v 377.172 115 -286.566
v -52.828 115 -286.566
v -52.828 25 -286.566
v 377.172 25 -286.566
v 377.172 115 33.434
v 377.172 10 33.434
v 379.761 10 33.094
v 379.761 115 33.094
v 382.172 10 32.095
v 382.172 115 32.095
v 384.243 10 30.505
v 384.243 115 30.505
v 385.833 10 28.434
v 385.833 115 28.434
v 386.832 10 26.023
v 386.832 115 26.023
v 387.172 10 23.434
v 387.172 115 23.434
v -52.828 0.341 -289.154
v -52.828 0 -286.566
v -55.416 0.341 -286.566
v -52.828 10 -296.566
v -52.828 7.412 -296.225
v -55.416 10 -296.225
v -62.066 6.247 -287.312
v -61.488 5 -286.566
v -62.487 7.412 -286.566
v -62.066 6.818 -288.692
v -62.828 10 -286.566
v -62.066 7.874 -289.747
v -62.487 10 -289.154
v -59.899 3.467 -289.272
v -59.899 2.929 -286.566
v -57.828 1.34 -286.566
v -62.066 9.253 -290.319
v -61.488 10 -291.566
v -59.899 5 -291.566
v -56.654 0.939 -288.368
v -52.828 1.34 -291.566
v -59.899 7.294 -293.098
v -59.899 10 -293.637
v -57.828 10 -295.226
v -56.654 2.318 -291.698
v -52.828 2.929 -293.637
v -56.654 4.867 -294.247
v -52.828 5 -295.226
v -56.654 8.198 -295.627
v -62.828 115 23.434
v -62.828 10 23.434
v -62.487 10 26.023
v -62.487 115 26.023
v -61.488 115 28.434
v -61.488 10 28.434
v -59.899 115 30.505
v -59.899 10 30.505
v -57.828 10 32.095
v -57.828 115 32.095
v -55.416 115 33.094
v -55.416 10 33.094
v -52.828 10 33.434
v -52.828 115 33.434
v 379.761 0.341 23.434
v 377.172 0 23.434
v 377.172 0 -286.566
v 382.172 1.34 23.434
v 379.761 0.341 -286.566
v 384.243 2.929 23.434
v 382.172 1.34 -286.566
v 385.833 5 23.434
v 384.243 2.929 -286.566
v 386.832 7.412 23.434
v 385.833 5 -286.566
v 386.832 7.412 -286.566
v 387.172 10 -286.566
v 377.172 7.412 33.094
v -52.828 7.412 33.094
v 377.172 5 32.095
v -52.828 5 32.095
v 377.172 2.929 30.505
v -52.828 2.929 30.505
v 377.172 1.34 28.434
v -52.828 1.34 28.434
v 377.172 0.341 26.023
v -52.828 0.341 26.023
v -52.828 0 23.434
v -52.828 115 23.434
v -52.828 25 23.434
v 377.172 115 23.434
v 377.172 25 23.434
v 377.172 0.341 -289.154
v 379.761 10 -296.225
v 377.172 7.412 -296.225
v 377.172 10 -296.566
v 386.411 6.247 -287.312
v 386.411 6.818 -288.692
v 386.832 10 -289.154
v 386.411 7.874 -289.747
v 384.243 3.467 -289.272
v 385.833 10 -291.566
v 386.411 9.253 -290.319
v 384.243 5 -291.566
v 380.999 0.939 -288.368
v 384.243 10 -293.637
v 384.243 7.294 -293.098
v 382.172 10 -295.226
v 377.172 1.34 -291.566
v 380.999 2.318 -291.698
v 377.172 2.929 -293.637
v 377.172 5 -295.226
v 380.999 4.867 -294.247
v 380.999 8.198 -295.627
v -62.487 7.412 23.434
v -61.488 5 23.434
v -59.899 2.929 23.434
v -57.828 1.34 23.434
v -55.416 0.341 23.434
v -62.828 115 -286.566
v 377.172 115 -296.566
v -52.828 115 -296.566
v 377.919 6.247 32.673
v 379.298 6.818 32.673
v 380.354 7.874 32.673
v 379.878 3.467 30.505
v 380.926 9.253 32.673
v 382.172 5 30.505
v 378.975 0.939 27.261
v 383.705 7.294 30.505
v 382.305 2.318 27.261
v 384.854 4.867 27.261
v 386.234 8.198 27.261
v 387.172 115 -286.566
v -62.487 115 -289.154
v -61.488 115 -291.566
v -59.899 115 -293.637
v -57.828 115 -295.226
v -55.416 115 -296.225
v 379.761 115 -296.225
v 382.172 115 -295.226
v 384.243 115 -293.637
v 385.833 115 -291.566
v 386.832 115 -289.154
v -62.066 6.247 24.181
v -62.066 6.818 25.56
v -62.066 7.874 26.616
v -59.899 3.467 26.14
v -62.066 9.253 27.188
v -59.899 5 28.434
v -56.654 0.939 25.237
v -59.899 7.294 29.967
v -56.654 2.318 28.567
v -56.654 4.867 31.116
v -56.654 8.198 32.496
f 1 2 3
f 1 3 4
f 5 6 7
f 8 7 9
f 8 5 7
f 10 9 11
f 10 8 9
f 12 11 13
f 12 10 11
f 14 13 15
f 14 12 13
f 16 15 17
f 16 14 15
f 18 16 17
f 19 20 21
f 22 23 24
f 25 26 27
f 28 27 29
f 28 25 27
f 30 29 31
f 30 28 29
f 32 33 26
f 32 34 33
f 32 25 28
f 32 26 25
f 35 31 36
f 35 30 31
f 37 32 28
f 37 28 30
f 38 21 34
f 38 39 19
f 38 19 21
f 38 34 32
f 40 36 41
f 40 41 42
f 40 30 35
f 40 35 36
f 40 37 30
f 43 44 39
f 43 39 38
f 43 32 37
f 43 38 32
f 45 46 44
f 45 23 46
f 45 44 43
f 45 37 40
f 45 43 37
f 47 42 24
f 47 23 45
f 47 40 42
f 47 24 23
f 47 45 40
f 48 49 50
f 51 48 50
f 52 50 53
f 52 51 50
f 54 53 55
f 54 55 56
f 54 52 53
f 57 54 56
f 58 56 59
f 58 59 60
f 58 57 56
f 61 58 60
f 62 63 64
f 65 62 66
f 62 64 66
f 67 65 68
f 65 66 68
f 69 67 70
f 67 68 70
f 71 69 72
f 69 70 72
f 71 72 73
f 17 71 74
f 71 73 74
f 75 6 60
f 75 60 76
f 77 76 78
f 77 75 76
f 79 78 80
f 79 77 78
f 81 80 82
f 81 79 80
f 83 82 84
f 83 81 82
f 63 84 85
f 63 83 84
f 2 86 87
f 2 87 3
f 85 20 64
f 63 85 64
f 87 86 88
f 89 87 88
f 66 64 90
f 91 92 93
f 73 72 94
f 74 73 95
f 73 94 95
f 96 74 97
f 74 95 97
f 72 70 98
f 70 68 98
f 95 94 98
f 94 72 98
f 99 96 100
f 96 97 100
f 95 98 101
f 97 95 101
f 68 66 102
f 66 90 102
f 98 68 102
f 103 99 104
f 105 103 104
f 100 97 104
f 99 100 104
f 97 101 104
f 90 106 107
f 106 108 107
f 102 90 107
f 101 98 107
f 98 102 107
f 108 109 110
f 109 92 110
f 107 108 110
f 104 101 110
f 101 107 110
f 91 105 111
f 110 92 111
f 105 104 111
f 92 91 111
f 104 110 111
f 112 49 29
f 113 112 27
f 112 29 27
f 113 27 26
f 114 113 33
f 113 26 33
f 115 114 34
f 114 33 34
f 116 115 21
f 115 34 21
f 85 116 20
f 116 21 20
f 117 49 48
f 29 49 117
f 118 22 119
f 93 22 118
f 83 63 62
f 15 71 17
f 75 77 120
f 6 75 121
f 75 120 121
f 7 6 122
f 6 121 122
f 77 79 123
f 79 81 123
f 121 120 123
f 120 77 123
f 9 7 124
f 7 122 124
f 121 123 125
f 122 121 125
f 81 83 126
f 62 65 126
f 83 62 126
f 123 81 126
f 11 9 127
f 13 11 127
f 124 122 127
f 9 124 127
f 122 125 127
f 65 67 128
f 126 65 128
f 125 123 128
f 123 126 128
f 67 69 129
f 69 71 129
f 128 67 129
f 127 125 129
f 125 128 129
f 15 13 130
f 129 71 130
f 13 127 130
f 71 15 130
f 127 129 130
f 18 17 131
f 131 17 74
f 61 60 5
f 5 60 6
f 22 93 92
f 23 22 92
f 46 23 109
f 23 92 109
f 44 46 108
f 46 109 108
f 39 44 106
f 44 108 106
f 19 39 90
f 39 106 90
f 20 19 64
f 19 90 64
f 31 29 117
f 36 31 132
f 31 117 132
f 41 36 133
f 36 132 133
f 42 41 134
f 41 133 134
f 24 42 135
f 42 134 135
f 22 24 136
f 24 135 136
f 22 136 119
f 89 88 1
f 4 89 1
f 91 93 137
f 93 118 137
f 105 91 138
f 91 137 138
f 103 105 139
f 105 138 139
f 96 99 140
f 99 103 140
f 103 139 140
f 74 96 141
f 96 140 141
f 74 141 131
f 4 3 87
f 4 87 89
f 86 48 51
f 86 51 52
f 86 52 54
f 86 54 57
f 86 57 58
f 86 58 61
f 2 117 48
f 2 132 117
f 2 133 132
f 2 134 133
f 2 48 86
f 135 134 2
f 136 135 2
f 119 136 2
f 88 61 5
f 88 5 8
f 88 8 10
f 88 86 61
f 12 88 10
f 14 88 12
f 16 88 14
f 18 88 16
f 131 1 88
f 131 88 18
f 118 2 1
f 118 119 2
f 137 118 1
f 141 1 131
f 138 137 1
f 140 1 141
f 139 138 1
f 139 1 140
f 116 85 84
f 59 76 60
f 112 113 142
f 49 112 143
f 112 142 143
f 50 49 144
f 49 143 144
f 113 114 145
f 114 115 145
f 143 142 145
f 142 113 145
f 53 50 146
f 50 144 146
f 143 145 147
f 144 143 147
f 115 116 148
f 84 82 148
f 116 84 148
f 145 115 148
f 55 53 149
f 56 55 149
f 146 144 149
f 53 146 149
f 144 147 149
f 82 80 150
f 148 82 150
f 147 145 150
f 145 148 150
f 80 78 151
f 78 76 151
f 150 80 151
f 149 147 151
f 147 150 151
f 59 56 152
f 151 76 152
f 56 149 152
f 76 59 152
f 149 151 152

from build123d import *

# Parameters (mm, degrees)
SKETCH1_W           = 450
SKETCH1_H           = 330
BOSS_EXTRUDE1_DEPTH = 115
SKETCH2_W           = 430
SKETCH2_H           = 310
CUT_EXTRUDE1_DEPTH  = 90
FILLET1_R           = 10


with BuildPart() as part:
    # Sketch1 → Boss-Extrude1 (new body)
    with BuildSketch(Plane(origin=(0, 0, 0), x_dir=(1, 0, 0), z_dir=(0, 1, 0))):
        with Locations((162.172357903, 131.565585437)):
            Rectangle(SKETCH1_W, SKETCH1_H)
    extrude(amount=BOSS_EXTRUDE1_DEPTH)

    # Sketch2 → Cut-Extrude1 (cut)
    with BuildSketch(Plane(origin=(0, 115, 0), x_dir=(1, 0, 0), z_dir=(0, 1, 0))):
        with Locations((162.172357903, 131.565585437)):
            Rectangle(SKETCH2_W, SKETCH2_H)
    extrude(amount=-CUT_EXTRUDE1_DEPTH, mode=Mode.SUBTRACT)

    # Fillet1
    fillet1_edges = [part.edges().sort_by_distance(p)[0] for p in [
        (162.172357903, 0, -296.565585437),
        (387.172357903, 0, -131.565585437),
        (162.172357903, 0, 33.434414563),
        (-62.827642097, 0, -131.565585437),
        (-62.827642097, 57.5, -296.565585437),
        (387.172357903, 57.5, -296.565585437),
        (387.172357903, 57.5, 33.434414563),
        (-62.827642097, 57.5, 33.434414563),
    ]]
    fillet(fillet1_edges, radius=FILLET1_R)


solid = part.part
